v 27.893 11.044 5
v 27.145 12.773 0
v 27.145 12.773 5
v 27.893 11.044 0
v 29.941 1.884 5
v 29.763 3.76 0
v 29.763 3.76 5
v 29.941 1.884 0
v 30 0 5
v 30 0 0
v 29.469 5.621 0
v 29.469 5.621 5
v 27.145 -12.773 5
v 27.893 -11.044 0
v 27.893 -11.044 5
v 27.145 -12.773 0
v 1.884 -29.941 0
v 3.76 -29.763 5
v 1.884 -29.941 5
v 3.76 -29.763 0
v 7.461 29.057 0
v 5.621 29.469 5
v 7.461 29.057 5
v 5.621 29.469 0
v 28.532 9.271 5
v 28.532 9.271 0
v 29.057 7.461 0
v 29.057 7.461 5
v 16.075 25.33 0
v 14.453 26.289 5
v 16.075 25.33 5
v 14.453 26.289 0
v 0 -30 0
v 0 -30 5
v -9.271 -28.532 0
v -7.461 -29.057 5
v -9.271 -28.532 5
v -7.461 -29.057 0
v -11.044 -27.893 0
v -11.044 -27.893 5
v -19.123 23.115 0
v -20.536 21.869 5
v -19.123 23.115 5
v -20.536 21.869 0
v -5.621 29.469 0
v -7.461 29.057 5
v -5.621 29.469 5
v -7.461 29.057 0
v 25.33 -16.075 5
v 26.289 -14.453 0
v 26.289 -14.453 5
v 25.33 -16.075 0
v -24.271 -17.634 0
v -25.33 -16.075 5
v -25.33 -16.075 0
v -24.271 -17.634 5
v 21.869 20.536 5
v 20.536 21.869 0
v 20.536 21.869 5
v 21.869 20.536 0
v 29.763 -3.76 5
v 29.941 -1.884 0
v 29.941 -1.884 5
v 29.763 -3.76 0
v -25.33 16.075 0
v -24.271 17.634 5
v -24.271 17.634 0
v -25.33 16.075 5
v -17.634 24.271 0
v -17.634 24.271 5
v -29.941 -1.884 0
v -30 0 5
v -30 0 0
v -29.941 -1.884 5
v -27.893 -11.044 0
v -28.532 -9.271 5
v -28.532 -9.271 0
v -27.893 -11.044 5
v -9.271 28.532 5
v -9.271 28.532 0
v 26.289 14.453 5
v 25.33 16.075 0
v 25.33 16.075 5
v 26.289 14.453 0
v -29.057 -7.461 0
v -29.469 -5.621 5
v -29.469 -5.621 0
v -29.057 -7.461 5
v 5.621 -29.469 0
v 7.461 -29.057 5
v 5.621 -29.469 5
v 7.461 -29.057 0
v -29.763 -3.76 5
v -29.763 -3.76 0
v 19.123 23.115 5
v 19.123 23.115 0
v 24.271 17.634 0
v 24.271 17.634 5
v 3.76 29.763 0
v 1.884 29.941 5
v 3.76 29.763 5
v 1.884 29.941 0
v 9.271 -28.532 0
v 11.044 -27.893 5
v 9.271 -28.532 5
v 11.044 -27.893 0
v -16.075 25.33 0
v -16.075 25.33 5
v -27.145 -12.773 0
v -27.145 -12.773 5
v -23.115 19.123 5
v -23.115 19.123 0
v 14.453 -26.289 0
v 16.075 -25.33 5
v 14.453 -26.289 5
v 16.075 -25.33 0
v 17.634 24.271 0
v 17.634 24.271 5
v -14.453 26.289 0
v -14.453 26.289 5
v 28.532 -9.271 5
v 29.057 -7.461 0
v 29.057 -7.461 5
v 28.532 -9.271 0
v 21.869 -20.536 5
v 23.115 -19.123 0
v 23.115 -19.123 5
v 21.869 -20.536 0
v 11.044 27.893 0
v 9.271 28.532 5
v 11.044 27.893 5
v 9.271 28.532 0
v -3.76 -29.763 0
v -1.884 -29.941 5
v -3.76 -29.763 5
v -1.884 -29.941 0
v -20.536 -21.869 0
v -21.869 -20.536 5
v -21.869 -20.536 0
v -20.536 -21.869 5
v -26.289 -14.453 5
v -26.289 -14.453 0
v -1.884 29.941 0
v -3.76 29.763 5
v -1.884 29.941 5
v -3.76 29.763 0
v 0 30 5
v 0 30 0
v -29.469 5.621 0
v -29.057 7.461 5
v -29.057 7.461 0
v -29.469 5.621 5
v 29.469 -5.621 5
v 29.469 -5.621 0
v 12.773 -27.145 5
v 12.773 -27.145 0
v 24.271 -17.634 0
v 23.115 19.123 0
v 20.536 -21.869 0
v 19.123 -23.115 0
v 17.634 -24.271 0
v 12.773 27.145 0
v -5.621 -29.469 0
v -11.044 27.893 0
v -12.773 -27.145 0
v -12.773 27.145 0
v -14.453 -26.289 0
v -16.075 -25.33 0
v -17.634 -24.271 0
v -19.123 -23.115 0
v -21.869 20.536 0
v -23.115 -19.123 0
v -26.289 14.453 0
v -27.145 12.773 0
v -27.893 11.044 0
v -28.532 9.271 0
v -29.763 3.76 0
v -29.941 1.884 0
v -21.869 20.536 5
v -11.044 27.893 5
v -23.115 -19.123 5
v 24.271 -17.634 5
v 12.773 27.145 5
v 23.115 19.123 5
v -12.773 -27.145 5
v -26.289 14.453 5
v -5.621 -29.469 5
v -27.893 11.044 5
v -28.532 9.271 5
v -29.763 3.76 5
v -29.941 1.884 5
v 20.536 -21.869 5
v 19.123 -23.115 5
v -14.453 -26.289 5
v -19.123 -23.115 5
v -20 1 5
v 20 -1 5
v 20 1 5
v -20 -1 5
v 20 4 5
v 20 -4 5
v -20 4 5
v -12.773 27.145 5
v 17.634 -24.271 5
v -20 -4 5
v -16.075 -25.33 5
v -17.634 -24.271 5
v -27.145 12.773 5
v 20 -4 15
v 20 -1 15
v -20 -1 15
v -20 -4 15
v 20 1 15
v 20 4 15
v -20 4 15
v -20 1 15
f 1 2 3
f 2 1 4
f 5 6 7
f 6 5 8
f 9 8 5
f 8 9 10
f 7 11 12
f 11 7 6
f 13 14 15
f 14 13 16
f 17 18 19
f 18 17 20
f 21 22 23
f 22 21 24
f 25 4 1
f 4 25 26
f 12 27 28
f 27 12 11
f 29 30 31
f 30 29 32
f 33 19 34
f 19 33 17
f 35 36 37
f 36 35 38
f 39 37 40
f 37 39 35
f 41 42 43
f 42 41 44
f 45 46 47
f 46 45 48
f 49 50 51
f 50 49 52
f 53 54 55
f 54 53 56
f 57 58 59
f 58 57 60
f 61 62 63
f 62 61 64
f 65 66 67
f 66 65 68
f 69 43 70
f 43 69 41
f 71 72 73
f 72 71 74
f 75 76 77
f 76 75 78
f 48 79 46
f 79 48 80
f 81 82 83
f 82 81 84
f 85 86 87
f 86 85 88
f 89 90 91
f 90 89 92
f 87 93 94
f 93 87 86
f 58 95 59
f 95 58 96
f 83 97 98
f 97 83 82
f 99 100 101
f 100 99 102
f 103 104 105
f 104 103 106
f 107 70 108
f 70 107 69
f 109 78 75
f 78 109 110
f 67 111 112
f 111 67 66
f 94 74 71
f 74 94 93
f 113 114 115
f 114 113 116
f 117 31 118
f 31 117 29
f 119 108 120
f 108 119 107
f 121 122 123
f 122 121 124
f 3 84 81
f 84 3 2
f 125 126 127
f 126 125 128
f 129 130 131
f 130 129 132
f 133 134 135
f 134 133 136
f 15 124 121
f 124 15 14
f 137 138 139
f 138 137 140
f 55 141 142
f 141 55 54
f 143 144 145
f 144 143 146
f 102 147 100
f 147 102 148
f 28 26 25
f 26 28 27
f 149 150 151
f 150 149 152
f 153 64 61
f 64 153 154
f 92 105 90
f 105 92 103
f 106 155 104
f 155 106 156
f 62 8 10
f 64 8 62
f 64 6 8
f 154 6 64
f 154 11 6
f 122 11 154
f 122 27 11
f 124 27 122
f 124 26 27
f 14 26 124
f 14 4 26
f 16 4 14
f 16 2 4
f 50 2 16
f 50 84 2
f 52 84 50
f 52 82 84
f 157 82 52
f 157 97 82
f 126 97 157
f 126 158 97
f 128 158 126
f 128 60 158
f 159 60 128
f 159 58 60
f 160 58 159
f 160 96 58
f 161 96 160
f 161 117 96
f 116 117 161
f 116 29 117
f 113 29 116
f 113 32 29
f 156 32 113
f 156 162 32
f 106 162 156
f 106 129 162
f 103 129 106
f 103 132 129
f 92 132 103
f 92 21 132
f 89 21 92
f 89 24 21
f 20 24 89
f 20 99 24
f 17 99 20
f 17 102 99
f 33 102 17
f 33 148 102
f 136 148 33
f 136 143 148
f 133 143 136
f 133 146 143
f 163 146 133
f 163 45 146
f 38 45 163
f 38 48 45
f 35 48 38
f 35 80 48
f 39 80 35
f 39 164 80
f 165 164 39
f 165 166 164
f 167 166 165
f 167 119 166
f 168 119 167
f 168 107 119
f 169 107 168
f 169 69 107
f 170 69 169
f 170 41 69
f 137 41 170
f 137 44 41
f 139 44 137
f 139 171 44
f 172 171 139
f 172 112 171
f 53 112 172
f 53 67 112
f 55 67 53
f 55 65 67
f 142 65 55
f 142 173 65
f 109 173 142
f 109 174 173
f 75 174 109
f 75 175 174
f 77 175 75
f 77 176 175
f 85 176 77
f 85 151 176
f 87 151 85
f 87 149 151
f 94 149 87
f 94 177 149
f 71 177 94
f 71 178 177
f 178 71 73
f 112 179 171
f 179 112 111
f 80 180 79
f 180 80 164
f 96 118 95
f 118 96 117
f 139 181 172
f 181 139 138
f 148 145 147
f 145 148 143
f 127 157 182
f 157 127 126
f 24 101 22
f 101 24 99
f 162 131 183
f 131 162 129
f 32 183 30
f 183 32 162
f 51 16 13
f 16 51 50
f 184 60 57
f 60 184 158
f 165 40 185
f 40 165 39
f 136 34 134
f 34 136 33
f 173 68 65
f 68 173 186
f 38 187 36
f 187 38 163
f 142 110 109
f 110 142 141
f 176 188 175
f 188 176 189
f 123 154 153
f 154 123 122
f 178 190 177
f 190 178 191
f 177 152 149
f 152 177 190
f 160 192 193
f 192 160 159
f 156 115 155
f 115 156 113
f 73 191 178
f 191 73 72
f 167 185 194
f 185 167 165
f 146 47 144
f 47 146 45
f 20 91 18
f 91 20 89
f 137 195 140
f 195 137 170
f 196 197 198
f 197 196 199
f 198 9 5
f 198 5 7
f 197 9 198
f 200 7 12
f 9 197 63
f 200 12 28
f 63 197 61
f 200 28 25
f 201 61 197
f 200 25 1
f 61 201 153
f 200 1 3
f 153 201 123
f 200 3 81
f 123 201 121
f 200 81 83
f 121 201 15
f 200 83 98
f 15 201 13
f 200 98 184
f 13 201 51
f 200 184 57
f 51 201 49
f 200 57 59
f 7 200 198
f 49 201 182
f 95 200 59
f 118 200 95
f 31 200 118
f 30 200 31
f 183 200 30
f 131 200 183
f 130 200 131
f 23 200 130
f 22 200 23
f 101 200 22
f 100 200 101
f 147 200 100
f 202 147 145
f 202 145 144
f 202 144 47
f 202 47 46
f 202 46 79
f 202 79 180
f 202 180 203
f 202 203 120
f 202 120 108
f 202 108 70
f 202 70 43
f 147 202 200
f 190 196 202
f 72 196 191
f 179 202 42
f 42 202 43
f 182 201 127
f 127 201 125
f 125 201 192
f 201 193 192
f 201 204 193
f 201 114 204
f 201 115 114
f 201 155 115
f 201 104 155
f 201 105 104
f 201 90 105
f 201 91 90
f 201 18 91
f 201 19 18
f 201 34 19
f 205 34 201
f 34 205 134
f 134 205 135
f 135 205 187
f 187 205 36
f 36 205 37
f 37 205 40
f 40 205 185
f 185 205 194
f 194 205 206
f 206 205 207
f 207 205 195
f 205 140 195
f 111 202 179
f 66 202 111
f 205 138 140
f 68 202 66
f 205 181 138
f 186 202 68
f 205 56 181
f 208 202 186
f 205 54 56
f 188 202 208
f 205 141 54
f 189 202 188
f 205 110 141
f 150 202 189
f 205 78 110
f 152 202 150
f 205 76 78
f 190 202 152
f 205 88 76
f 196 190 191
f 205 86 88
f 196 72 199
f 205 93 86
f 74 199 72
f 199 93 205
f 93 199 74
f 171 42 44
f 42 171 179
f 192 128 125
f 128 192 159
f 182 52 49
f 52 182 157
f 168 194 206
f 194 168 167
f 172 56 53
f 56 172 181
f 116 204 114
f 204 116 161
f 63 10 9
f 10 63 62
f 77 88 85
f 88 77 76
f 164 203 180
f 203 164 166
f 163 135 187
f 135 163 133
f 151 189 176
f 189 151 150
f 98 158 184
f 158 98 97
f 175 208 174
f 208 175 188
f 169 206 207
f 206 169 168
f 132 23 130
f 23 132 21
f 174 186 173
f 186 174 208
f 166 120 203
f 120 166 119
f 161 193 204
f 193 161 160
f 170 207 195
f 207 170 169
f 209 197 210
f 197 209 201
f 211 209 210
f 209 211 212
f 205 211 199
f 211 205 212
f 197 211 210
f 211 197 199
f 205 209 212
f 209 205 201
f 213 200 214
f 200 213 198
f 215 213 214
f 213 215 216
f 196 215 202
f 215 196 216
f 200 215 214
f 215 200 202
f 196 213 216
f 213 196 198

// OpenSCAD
module stand(){
    cylinder(d = 60, h = 5, $fn=100);
    translate([-40/2,-1 -3,0]) cube([40,3,15]);
    translate([-40/2,1,0]) cube([40,3,15]);
}

stand();
